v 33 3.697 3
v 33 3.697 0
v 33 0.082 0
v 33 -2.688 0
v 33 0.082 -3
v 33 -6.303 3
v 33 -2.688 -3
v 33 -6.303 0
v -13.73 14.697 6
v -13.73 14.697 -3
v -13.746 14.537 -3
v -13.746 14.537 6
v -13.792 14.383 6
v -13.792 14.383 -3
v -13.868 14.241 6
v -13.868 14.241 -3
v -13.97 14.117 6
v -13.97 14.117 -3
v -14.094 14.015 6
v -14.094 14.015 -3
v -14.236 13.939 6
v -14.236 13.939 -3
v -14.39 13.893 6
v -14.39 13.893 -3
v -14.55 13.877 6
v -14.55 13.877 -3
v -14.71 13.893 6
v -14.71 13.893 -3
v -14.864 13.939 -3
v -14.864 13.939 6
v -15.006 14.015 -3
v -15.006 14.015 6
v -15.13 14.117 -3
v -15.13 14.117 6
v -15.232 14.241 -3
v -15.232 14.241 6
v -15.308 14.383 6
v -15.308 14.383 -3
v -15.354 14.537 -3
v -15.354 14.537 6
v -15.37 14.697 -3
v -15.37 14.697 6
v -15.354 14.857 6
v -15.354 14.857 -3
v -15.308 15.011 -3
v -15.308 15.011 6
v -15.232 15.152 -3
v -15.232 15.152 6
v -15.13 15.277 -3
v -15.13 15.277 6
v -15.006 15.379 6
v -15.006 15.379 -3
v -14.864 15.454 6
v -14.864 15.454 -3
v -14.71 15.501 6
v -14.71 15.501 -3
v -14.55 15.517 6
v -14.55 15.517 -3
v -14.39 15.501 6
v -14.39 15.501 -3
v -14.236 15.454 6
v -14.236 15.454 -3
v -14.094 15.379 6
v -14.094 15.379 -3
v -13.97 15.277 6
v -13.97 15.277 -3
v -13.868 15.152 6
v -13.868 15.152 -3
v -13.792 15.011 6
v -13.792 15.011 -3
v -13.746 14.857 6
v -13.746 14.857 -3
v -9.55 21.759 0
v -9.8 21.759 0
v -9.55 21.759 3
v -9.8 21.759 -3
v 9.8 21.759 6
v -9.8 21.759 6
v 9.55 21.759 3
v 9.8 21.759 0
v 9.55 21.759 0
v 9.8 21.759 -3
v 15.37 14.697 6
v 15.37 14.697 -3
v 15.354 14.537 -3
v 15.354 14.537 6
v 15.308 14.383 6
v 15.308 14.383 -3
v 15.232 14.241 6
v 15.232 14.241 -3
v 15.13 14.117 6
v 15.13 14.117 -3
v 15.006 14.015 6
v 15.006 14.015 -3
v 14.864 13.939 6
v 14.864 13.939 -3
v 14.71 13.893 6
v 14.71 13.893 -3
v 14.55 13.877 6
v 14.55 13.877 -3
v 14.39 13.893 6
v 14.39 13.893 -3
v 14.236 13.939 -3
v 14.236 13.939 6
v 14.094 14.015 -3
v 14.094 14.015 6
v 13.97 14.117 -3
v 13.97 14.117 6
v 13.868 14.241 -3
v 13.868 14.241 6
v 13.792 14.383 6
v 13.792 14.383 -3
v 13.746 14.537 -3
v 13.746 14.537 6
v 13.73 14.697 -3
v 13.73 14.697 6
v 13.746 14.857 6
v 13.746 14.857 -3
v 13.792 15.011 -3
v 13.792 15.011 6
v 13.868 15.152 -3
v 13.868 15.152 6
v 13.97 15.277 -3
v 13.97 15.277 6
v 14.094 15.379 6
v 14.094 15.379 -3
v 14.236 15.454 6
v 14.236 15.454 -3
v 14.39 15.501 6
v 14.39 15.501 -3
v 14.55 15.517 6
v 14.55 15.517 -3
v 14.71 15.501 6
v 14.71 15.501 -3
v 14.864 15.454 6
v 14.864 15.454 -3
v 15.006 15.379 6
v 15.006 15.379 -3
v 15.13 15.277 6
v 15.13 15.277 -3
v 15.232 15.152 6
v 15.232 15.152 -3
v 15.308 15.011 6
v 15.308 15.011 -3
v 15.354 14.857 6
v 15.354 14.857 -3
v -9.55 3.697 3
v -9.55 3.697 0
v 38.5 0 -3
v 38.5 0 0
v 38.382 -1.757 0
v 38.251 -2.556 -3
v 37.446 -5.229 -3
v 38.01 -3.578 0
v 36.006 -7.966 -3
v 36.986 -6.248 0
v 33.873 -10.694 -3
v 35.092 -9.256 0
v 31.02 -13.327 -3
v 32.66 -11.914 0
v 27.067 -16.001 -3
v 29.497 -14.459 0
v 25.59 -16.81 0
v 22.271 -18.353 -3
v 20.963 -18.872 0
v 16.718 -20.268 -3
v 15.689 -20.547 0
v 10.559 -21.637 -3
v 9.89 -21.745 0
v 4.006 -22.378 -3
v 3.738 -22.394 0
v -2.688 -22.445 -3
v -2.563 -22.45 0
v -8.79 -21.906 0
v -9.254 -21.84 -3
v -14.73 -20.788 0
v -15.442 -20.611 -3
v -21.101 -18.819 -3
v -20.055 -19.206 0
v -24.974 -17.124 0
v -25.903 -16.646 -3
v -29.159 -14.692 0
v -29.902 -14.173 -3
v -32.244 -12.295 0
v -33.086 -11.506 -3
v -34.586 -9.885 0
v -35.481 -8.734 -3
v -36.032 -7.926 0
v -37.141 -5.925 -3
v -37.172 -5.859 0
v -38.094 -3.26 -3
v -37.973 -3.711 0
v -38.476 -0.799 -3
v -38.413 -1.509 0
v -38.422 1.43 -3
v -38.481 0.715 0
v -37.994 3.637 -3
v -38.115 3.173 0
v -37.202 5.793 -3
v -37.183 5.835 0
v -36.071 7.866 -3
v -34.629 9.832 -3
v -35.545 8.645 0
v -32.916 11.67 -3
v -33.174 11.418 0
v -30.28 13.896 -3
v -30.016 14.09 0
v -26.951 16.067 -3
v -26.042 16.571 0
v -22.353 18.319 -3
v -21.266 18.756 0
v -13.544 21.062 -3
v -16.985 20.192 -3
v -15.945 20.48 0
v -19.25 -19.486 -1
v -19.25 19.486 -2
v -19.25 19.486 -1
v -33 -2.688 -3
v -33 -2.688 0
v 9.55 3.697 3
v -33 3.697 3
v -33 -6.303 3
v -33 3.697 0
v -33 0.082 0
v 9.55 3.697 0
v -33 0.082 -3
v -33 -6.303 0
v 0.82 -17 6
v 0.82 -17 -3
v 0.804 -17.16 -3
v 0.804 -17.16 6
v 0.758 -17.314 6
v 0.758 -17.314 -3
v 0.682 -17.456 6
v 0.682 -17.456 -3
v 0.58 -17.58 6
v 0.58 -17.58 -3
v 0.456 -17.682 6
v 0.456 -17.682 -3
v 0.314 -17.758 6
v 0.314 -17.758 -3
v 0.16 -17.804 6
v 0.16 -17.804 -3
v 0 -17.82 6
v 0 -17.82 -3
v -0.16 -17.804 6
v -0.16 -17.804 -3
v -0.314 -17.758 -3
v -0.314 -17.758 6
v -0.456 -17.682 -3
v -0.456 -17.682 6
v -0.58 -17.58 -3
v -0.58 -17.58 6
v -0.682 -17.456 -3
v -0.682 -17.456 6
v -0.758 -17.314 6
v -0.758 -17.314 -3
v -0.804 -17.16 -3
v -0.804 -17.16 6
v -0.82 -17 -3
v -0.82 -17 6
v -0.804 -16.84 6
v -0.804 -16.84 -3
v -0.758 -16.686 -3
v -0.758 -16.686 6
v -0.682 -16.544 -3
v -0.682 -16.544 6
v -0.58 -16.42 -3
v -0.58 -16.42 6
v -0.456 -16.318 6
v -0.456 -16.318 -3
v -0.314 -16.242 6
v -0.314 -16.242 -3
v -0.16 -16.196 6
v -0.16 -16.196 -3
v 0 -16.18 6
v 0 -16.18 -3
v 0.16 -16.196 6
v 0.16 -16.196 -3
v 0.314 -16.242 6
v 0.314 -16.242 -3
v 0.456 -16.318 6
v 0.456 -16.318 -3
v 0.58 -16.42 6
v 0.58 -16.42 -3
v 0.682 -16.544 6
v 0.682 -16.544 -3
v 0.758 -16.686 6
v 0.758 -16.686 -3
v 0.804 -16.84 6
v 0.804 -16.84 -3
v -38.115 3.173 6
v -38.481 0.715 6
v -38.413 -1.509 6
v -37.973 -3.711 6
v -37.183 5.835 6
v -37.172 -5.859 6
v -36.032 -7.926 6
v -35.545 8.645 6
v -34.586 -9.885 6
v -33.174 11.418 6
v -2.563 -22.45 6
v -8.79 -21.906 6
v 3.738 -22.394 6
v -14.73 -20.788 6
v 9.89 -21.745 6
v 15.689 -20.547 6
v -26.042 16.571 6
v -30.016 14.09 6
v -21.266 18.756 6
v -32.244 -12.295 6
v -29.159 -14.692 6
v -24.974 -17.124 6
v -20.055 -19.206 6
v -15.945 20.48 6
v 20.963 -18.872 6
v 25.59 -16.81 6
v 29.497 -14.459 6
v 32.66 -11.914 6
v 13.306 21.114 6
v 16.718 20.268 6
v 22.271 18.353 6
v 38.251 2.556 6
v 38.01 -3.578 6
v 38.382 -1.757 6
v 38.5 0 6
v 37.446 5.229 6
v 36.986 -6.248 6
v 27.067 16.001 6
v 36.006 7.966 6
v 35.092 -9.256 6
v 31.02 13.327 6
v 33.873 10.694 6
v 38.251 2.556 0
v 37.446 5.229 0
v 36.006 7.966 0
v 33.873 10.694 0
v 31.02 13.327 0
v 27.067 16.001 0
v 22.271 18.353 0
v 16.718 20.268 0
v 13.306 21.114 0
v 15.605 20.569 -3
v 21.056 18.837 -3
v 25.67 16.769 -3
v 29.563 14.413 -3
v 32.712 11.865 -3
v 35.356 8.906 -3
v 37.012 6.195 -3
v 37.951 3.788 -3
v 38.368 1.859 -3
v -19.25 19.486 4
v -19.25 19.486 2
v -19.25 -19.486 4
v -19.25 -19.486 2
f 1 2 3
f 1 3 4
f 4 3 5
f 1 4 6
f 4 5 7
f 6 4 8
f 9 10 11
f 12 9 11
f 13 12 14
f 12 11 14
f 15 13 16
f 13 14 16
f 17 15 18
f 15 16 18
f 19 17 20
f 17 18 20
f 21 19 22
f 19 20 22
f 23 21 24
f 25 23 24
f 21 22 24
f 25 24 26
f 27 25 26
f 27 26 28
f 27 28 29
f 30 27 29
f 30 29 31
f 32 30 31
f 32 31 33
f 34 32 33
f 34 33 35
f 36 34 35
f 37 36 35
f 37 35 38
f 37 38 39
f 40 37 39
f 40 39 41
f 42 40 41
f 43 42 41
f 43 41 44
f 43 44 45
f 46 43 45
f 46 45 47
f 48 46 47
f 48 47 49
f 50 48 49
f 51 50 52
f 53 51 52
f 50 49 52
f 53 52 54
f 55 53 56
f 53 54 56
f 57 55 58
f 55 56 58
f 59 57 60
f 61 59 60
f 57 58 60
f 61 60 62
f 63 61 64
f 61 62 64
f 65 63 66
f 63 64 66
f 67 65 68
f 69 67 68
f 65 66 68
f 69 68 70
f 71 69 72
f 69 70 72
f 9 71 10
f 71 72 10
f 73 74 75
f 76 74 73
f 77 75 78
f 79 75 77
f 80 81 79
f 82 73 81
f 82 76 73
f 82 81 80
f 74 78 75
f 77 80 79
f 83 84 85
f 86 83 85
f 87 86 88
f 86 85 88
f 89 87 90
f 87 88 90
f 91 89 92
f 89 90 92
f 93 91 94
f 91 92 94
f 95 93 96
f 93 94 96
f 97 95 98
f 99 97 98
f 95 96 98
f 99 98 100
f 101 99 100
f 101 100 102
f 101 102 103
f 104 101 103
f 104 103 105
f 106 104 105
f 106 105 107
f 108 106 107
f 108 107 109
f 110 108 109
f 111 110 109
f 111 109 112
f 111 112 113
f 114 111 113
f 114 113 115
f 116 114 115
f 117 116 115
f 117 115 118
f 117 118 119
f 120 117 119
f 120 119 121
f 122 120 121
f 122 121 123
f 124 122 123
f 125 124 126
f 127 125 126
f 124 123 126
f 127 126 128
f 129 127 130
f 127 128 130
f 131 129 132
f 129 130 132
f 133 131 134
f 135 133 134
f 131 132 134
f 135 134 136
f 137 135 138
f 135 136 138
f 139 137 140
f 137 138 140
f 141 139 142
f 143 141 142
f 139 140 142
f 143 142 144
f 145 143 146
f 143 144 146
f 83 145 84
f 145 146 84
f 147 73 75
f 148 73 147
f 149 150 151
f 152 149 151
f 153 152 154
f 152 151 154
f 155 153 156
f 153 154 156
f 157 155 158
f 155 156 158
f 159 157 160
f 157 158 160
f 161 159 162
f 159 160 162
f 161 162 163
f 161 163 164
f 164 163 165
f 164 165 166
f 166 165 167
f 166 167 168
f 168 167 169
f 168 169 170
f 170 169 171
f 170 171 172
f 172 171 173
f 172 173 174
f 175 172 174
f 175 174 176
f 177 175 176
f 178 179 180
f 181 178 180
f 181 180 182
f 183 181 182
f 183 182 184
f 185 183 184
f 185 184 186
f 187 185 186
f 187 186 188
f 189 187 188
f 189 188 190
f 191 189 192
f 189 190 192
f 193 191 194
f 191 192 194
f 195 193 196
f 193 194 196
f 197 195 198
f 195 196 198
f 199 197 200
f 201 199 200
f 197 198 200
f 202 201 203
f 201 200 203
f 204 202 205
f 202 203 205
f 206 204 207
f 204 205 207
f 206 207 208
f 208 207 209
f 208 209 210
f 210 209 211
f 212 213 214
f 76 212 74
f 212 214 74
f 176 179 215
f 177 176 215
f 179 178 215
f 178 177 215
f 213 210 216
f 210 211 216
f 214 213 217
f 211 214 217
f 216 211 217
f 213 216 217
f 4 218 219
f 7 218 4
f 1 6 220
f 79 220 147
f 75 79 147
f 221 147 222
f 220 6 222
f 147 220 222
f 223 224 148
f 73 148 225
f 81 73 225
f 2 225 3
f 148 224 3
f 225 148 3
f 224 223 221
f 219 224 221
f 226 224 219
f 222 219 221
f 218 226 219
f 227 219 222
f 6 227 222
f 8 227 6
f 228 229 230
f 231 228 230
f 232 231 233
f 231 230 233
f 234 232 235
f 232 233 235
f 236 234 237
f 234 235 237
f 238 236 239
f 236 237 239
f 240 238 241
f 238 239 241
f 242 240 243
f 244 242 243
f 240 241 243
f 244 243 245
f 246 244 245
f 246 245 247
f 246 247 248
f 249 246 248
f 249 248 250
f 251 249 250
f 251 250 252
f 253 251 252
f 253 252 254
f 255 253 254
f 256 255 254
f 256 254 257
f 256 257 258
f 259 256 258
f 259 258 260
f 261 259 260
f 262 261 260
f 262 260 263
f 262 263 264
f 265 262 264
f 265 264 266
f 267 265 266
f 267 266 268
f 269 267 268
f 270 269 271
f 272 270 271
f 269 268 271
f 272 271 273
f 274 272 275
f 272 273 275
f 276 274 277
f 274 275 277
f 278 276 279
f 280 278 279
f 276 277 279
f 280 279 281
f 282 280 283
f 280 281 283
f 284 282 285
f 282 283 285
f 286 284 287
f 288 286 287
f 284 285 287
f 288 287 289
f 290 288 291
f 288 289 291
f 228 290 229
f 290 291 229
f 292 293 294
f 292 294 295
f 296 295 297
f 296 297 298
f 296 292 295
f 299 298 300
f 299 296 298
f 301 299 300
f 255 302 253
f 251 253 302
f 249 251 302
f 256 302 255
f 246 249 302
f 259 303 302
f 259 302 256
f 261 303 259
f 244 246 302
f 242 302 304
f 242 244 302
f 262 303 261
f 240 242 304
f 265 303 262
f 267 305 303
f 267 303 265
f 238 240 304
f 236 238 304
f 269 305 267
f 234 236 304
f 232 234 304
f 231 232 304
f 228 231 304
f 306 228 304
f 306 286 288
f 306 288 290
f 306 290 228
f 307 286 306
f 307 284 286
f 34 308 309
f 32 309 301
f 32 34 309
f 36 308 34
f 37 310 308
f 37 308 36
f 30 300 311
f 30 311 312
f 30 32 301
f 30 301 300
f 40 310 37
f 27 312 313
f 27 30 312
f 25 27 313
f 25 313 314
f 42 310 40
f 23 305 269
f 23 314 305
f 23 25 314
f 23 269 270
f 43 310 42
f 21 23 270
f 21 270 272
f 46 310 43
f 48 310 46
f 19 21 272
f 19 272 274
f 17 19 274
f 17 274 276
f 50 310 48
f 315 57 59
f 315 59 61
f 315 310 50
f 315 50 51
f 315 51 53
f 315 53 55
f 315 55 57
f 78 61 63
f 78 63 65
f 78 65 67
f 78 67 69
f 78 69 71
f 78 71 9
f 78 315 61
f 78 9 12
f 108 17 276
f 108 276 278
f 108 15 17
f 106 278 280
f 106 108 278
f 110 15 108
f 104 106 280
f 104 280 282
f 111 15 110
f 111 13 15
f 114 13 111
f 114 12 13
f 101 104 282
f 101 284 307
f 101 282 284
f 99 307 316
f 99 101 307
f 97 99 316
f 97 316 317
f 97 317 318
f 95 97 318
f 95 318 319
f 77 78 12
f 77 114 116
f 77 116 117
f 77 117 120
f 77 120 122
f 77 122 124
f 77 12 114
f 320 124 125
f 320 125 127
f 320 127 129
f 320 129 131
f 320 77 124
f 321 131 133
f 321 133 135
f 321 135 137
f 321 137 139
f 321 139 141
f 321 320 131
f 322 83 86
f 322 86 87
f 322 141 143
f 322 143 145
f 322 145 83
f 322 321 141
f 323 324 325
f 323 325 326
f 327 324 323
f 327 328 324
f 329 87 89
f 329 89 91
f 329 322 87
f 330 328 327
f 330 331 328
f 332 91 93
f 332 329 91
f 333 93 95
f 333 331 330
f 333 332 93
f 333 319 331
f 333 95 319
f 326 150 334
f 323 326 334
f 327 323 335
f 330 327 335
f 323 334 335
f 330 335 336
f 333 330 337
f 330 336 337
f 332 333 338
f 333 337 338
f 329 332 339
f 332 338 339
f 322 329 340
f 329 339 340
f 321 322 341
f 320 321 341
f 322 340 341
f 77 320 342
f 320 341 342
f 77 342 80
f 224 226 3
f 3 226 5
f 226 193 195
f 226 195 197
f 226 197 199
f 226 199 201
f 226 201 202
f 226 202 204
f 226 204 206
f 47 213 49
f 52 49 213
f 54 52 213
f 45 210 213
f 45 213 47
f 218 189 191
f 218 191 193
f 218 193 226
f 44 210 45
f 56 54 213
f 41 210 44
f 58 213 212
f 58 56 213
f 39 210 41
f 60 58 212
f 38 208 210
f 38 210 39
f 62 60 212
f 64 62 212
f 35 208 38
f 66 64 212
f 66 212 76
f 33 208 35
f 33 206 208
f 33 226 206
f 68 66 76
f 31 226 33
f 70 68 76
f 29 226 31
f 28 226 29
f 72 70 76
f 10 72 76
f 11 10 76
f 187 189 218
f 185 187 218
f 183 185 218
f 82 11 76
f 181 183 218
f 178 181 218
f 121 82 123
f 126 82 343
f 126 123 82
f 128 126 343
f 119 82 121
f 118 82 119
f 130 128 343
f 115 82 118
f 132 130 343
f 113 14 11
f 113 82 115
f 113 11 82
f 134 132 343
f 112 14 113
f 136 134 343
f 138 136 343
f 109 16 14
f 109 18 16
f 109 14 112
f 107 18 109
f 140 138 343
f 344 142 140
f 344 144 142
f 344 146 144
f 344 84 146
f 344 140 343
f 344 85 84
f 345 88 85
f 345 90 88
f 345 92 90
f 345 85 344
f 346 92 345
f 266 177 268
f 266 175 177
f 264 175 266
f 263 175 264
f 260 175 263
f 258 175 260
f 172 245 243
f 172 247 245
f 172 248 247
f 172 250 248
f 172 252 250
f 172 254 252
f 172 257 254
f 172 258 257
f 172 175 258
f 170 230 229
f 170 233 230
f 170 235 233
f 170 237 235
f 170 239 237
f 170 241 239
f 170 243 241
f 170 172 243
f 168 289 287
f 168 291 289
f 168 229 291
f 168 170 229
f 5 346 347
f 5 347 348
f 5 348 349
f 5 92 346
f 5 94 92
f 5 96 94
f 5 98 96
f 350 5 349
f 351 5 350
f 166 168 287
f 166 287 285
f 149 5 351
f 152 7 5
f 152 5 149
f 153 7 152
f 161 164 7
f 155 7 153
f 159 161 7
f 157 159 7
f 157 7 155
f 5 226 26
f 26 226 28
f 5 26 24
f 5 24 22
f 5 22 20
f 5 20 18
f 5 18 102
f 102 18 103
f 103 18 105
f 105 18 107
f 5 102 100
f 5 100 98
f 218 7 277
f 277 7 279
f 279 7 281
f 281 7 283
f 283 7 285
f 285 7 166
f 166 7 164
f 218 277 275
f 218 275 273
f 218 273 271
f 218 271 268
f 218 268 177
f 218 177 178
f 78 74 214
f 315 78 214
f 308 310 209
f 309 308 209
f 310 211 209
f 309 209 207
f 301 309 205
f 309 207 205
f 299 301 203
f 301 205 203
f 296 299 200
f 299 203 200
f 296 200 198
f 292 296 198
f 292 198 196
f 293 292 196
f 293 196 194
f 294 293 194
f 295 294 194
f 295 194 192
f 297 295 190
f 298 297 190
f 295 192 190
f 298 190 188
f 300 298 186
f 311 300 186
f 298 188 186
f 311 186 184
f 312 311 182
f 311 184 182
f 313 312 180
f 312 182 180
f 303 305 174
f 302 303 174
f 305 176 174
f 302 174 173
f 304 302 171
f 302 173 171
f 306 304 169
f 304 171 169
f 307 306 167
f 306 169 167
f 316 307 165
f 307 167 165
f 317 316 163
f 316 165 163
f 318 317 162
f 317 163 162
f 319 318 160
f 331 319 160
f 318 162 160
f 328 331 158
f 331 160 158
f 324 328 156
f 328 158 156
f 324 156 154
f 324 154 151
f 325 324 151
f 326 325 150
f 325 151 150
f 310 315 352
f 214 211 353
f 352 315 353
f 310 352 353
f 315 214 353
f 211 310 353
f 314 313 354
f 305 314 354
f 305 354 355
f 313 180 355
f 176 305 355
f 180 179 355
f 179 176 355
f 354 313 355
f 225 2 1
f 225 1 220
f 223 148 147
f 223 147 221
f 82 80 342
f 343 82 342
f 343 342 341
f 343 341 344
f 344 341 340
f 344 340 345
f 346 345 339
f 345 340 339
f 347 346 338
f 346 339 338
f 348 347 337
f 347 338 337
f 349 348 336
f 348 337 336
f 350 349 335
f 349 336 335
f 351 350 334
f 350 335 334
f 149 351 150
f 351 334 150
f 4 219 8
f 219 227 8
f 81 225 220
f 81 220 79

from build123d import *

# Parameters (mm, degrees)
PAD_DEPTH       = 6
POCKET_DEPTH    = 3
PAD001_DEPTH    = 3
SKETCH003_W     = 66
SKETCH003_H     = 2.77
POCKET001_DEPTH = 3
SKETCH004_W     = 19.6
SKETCH004_H     = 1
POCKET002_DEPTH = 9.001
SKETCH005_R     = 0.82
POCKET003_DEPTH = 9.001


with BuildPart() as part:
    # Sketch → Pad (new body)
    with BuildSketch(Plane.XY):
        with BuildLine():
            add(Edge.make_bspline(
                [(38.5, 0), (38.5, 38.971143), (-19.25, 19.485572), (-77, 0), (-19.25, -19.485572), (38.5, -38.971143), (38.5, 0)],
                knots=[0, 0, 0, 2.094395, 2.094395, 4.18879, 4.18879, 6.283185, 6.283185, 6.283185], degree=2, weights=[1, 0.5, 1, 0.5, 1, 0.5, 1]))
        make_face()
    extrude(amount=PAD_DEPTH)

    # Sketch001 (on Face2 of Pad) → Pocket (cut)
    with BuildSketch(Plane(origin=(0, 0, 0), x_dir=(1, 0, 0), z_dir=(0, 0, -1))):
        Polygon((9.55, -3.696801), (9.55, -21.796801), (-9.55, -21.796801), (-9.55, -3.696801), (-33, -3.696801), (-33, 6.303199), (33, 6.303199), (33, -3.696801), align=None)
    extrude(amount=-POCKET_DEPTH, mode=Mode.SUBTRACT)

    # Sketch002 (on Face2 of Pocket) → Pad001 (join)
    with BuildSketch(Plane(origin=(0, 0, 0), x_dir=(1, 0, 0), z_dir=(0, 0, -1))):
        with BuildLine():
            add(Edge.make_bspline(
                [(38.5, 0), (38.5, 38.971143), (-19.25, 19.485572), (-77, 0), (-19.25, -19.485572), (38.5, -38.971143), (38.5, 0)],
                knots=[0, 0, 0, 2.094395, 2.094395, 4.18879, 4.18879, 6.283185, 6.283185, 6.283185], degree=2, weights=[1, 0.5, 1, 0.5, 1, 0.5, 1]))
        make_face()
    extrude(amount=PAD001_DEPTH)

    # Sketch003 (on Face4 of Pad001) → Pocket001 (cut)
    with BuildSketch(Plane(origin=(0, 0, -3), x_dir=(1, 0, 0), z_dir=(0, 0, -1))):
        with Locations((0, 1.303199)):
            Rectangle(SKETCH003_W, SKETCH003_H)
    extrude(amount=-POCKET001_DEPTH, mode=Mode.SUBTRACT)

    # Sketch004 (on Face4 of Pocket001) → Pocket002 (cut, through all)
    with BuildSketch(Plane(origin=(0, 0, -3), x_dir=(1, 0, 0), z_dir=(0, 0, -1))):
        with Locations((0, -22.258868)):
            Rectangle(SKETCH004_W, SKETCH004_H)
    extrude(amount=-POCKET002_DEPTH, mode=Mode.SUBTRACT)

    # Sketch005 (on Face7 of Pocket002) → Pocket003 (cut, through all)
    with BuildSketch(Plane(origin=(0, 0, -3), x_dir=(1, 0, 0), z_dir=(0, 0, -1))):
        with Locations((-14.55, -14.696801)):
            Circle(SKETCH005_R)
        with Locations((0, 17)):
            Circle(SKETCH005_R)
        with Locations((14.55, -14.696801)):
            Circle(SKETCH005_R)
    extrude(amount=-POCKET003_DEPTH, mode=Mode.SUBTRACT)


solid = part.part
